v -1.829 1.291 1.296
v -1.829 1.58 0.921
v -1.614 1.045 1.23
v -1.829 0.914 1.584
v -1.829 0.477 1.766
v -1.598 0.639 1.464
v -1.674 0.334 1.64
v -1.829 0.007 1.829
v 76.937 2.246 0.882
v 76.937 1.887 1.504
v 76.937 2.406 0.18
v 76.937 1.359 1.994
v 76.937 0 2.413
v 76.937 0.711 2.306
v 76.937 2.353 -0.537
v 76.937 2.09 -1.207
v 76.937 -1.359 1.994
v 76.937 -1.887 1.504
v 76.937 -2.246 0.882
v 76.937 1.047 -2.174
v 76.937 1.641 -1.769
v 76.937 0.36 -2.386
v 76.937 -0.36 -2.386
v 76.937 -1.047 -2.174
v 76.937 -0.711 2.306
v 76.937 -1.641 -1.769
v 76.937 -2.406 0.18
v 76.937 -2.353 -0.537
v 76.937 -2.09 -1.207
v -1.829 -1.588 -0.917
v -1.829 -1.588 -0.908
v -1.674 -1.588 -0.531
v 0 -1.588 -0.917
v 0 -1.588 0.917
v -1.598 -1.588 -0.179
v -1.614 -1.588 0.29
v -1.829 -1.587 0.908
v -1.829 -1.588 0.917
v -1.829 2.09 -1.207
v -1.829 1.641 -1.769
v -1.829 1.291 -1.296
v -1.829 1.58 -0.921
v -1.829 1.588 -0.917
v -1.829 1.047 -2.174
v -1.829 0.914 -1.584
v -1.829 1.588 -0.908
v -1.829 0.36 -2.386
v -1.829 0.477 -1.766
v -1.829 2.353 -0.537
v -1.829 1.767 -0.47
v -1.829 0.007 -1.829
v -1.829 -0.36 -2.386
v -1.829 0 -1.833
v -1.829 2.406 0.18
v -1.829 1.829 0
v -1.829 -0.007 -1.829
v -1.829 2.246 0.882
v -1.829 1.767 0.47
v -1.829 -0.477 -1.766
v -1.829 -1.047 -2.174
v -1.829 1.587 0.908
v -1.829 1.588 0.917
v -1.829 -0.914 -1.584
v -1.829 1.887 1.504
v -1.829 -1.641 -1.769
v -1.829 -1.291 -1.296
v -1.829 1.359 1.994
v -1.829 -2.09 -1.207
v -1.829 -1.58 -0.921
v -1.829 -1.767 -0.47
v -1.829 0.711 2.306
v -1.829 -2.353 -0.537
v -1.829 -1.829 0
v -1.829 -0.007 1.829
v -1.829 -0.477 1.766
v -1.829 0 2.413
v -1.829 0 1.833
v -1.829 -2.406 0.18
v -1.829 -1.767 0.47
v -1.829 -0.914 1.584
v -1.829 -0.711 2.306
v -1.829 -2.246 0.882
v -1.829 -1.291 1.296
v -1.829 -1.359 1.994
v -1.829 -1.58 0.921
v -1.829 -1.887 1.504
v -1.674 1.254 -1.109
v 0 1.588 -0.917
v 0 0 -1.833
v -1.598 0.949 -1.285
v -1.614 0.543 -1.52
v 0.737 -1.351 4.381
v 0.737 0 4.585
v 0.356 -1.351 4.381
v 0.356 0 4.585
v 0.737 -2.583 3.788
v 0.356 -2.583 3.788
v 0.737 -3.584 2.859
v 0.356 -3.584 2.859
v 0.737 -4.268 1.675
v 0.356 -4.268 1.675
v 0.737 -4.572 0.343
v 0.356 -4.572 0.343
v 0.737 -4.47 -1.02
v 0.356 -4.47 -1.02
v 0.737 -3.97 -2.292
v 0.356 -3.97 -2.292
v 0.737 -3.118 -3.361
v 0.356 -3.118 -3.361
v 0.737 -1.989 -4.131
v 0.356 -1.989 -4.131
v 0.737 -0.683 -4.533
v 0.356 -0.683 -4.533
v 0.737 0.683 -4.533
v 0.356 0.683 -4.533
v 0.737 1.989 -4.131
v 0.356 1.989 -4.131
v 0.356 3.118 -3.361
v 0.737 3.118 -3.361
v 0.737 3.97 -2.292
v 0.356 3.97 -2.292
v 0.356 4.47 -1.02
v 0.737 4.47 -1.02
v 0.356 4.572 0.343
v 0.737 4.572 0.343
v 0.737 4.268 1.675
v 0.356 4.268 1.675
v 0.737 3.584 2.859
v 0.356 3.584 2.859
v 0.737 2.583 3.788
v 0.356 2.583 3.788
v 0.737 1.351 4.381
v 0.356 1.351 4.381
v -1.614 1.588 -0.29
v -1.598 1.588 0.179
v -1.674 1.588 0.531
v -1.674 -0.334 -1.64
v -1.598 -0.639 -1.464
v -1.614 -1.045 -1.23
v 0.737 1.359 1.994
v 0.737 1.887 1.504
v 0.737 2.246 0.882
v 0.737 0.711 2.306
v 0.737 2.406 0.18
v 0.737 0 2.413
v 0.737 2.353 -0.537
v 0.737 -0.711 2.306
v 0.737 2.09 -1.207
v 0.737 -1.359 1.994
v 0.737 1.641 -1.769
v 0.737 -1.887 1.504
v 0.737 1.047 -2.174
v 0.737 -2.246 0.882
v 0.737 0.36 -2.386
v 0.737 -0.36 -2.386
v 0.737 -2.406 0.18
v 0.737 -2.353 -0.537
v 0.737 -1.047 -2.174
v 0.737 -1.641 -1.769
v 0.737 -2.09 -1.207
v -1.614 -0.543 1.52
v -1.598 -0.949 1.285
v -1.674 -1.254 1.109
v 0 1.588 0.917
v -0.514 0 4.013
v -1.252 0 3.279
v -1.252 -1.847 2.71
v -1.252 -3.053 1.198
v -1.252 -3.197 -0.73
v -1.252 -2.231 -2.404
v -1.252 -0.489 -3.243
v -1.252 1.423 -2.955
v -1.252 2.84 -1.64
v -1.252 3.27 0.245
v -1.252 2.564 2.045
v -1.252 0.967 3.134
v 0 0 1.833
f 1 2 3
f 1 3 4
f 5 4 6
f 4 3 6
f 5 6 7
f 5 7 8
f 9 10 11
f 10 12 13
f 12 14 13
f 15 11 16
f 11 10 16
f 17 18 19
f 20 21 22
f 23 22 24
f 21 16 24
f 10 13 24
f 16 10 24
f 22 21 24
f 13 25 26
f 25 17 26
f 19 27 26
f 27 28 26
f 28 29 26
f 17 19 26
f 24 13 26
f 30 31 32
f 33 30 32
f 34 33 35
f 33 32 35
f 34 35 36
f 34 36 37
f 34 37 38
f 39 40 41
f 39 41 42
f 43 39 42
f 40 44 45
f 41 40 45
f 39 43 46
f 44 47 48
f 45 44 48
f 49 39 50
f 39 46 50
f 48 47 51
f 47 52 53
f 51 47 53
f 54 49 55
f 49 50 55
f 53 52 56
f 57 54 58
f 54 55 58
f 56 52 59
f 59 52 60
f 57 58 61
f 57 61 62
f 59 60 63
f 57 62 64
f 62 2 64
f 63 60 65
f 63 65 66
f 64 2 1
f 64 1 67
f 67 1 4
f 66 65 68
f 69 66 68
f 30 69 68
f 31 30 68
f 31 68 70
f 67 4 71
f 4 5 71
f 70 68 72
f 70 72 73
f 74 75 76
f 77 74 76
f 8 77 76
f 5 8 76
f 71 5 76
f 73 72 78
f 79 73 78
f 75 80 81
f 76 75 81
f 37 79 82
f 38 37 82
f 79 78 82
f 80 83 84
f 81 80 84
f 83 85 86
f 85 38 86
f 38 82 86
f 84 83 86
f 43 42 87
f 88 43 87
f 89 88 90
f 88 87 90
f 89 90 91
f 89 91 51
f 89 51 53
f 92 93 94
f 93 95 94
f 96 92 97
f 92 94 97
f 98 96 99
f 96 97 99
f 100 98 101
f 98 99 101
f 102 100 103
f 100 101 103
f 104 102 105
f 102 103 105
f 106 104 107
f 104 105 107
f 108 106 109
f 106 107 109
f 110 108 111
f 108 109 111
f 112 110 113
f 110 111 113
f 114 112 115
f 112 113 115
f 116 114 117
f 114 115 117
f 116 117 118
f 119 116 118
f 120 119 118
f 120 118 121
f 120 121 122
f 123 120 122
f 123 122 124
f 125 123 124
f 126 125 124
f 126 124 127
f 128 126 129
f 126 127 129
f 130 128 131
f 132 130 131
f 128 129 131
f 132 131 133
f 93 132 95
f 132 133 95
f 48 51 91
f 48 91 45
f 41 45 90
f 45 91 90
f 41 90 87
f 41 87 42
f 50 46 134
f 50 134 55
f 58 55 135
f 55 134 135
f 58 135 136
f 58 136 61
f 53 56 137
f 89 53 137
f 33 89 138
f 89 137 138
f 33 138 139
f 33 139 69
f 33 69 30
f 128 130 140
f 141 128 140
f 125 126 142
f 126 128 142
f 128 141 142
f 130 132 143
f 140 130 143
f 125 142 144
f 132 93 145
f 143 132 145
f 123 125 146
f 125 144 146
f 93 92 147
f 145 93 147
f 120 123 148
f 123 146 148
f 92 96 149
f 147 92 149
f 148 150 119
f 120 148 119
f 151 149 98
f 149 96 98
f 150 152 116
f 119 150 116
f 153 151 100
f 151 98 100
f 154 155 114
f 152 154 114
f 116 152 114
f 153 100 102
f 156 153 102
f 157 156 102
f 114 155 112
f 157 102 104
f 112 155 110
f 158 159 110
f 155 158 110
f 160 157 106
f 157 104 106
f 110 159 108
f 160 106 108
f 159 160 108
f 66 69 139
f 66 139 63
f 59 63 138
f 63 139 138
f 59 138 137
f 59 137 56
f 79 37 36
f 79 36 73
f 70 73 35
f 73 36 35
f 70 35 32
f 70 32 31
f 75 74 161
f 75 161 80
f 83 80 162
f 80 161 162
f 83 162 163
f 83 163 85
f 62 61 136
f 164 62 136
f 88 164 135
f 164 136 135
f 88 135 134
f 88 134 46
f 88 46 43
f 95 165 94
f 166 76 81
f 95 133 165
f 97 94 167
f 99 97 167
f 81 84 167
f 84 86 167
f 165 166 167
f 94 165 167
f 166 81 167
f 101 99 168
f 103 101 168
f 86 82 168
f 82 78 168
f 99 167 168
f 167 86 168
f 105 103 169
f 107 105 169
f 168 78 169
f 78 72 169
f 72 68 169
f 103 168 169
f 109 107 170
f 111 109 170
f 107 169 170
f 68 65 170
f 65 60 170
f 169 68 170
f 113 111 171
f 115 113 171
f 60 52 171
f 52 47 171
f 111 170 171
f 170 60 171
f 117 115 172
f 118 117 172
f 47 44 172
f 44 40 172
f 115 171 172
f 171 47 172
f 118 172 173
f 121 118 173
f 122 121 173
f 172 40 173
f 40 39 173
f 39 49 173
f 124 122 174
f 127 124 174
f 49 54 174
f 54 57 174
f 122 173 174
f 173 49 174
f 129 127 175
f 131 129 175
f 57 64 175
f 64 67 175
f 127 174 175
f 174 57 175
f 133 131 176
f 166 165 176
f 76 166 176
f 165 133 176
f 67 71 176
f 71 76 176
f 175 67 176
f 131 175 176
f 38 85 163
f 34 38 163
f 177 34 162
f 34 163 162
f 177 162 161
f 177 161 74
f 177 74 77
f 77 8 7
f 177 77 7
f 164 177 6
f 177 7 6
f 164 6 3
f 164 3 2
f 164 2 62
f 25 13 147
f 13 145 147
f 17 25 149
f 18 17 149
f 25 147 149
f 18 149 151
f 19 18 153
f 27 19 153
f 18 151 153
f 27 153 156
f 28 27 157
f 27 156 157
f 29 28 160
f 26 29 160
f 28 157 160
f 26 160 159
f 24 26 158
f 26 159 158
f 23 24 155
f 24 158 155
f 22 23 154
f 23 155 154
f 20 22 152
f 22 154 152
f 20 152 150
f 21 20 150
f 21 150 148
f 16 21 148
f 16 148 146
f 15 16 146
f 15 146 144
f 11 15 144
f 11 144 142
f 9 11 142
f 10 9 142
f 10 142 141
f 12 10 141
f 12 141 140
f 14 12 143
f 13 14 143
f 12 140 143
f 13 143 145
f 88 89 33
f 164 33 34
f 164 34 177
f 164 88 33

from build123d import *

# Parameters (mm, degrees)
CUT_EXTRUDE1_DEPTH = 1.8288


with BuildPart() as part:
    # Sketch1 → Revolve1 (revolve)
    with BuildSketch(Plane.XY, mode=Mode.PRIVATE) as revolve1_sk:
        with BuildLine():
            Line((0, 0), (76.9366, 0))
            Line((76.9366, 0), (76.9366, 2.413))
            Line((76.9366, 2.413), (0.7366, 2.413))
            Line((0.7366, 2.413), (0.7366, 4.5847))
            Line((0.7366, 4.5847), (0.3556, 4.5847))
            ThreePointArc((0.3556, 4.5847), (-0.901703741, 3.66491926), (-1.8288, 2.413))
            Line((-1.8288, 2.413), (-1.8288, 1.8288))
            Line((-1.8288, 1.8288), (0, 0))
        make_face()
    revolve(revolve1_sk.sketch.rotate(Axis((0, 0, 0), (1, 0, 0)), 90), axis=Axis((0, 0, 0), (1, 0, 0)))

    # Sketch2 → Cut-Extrude1 (cut)
    with BuildSketch(Plane.ZY.offset(1.8288)):
        Polygon((1.833087105, 0), (0.916543552, 1.5875), (-0.916543552, 1.5875), (-1.833087105, 0), (-0.916543552, -1.5875), (0.916543552, -1.5875), align=None)
    extrude(amount=-CUT_EXTRUDE1_DEPTH, mode=Mode.SUBTRACT)


solid = part.part
